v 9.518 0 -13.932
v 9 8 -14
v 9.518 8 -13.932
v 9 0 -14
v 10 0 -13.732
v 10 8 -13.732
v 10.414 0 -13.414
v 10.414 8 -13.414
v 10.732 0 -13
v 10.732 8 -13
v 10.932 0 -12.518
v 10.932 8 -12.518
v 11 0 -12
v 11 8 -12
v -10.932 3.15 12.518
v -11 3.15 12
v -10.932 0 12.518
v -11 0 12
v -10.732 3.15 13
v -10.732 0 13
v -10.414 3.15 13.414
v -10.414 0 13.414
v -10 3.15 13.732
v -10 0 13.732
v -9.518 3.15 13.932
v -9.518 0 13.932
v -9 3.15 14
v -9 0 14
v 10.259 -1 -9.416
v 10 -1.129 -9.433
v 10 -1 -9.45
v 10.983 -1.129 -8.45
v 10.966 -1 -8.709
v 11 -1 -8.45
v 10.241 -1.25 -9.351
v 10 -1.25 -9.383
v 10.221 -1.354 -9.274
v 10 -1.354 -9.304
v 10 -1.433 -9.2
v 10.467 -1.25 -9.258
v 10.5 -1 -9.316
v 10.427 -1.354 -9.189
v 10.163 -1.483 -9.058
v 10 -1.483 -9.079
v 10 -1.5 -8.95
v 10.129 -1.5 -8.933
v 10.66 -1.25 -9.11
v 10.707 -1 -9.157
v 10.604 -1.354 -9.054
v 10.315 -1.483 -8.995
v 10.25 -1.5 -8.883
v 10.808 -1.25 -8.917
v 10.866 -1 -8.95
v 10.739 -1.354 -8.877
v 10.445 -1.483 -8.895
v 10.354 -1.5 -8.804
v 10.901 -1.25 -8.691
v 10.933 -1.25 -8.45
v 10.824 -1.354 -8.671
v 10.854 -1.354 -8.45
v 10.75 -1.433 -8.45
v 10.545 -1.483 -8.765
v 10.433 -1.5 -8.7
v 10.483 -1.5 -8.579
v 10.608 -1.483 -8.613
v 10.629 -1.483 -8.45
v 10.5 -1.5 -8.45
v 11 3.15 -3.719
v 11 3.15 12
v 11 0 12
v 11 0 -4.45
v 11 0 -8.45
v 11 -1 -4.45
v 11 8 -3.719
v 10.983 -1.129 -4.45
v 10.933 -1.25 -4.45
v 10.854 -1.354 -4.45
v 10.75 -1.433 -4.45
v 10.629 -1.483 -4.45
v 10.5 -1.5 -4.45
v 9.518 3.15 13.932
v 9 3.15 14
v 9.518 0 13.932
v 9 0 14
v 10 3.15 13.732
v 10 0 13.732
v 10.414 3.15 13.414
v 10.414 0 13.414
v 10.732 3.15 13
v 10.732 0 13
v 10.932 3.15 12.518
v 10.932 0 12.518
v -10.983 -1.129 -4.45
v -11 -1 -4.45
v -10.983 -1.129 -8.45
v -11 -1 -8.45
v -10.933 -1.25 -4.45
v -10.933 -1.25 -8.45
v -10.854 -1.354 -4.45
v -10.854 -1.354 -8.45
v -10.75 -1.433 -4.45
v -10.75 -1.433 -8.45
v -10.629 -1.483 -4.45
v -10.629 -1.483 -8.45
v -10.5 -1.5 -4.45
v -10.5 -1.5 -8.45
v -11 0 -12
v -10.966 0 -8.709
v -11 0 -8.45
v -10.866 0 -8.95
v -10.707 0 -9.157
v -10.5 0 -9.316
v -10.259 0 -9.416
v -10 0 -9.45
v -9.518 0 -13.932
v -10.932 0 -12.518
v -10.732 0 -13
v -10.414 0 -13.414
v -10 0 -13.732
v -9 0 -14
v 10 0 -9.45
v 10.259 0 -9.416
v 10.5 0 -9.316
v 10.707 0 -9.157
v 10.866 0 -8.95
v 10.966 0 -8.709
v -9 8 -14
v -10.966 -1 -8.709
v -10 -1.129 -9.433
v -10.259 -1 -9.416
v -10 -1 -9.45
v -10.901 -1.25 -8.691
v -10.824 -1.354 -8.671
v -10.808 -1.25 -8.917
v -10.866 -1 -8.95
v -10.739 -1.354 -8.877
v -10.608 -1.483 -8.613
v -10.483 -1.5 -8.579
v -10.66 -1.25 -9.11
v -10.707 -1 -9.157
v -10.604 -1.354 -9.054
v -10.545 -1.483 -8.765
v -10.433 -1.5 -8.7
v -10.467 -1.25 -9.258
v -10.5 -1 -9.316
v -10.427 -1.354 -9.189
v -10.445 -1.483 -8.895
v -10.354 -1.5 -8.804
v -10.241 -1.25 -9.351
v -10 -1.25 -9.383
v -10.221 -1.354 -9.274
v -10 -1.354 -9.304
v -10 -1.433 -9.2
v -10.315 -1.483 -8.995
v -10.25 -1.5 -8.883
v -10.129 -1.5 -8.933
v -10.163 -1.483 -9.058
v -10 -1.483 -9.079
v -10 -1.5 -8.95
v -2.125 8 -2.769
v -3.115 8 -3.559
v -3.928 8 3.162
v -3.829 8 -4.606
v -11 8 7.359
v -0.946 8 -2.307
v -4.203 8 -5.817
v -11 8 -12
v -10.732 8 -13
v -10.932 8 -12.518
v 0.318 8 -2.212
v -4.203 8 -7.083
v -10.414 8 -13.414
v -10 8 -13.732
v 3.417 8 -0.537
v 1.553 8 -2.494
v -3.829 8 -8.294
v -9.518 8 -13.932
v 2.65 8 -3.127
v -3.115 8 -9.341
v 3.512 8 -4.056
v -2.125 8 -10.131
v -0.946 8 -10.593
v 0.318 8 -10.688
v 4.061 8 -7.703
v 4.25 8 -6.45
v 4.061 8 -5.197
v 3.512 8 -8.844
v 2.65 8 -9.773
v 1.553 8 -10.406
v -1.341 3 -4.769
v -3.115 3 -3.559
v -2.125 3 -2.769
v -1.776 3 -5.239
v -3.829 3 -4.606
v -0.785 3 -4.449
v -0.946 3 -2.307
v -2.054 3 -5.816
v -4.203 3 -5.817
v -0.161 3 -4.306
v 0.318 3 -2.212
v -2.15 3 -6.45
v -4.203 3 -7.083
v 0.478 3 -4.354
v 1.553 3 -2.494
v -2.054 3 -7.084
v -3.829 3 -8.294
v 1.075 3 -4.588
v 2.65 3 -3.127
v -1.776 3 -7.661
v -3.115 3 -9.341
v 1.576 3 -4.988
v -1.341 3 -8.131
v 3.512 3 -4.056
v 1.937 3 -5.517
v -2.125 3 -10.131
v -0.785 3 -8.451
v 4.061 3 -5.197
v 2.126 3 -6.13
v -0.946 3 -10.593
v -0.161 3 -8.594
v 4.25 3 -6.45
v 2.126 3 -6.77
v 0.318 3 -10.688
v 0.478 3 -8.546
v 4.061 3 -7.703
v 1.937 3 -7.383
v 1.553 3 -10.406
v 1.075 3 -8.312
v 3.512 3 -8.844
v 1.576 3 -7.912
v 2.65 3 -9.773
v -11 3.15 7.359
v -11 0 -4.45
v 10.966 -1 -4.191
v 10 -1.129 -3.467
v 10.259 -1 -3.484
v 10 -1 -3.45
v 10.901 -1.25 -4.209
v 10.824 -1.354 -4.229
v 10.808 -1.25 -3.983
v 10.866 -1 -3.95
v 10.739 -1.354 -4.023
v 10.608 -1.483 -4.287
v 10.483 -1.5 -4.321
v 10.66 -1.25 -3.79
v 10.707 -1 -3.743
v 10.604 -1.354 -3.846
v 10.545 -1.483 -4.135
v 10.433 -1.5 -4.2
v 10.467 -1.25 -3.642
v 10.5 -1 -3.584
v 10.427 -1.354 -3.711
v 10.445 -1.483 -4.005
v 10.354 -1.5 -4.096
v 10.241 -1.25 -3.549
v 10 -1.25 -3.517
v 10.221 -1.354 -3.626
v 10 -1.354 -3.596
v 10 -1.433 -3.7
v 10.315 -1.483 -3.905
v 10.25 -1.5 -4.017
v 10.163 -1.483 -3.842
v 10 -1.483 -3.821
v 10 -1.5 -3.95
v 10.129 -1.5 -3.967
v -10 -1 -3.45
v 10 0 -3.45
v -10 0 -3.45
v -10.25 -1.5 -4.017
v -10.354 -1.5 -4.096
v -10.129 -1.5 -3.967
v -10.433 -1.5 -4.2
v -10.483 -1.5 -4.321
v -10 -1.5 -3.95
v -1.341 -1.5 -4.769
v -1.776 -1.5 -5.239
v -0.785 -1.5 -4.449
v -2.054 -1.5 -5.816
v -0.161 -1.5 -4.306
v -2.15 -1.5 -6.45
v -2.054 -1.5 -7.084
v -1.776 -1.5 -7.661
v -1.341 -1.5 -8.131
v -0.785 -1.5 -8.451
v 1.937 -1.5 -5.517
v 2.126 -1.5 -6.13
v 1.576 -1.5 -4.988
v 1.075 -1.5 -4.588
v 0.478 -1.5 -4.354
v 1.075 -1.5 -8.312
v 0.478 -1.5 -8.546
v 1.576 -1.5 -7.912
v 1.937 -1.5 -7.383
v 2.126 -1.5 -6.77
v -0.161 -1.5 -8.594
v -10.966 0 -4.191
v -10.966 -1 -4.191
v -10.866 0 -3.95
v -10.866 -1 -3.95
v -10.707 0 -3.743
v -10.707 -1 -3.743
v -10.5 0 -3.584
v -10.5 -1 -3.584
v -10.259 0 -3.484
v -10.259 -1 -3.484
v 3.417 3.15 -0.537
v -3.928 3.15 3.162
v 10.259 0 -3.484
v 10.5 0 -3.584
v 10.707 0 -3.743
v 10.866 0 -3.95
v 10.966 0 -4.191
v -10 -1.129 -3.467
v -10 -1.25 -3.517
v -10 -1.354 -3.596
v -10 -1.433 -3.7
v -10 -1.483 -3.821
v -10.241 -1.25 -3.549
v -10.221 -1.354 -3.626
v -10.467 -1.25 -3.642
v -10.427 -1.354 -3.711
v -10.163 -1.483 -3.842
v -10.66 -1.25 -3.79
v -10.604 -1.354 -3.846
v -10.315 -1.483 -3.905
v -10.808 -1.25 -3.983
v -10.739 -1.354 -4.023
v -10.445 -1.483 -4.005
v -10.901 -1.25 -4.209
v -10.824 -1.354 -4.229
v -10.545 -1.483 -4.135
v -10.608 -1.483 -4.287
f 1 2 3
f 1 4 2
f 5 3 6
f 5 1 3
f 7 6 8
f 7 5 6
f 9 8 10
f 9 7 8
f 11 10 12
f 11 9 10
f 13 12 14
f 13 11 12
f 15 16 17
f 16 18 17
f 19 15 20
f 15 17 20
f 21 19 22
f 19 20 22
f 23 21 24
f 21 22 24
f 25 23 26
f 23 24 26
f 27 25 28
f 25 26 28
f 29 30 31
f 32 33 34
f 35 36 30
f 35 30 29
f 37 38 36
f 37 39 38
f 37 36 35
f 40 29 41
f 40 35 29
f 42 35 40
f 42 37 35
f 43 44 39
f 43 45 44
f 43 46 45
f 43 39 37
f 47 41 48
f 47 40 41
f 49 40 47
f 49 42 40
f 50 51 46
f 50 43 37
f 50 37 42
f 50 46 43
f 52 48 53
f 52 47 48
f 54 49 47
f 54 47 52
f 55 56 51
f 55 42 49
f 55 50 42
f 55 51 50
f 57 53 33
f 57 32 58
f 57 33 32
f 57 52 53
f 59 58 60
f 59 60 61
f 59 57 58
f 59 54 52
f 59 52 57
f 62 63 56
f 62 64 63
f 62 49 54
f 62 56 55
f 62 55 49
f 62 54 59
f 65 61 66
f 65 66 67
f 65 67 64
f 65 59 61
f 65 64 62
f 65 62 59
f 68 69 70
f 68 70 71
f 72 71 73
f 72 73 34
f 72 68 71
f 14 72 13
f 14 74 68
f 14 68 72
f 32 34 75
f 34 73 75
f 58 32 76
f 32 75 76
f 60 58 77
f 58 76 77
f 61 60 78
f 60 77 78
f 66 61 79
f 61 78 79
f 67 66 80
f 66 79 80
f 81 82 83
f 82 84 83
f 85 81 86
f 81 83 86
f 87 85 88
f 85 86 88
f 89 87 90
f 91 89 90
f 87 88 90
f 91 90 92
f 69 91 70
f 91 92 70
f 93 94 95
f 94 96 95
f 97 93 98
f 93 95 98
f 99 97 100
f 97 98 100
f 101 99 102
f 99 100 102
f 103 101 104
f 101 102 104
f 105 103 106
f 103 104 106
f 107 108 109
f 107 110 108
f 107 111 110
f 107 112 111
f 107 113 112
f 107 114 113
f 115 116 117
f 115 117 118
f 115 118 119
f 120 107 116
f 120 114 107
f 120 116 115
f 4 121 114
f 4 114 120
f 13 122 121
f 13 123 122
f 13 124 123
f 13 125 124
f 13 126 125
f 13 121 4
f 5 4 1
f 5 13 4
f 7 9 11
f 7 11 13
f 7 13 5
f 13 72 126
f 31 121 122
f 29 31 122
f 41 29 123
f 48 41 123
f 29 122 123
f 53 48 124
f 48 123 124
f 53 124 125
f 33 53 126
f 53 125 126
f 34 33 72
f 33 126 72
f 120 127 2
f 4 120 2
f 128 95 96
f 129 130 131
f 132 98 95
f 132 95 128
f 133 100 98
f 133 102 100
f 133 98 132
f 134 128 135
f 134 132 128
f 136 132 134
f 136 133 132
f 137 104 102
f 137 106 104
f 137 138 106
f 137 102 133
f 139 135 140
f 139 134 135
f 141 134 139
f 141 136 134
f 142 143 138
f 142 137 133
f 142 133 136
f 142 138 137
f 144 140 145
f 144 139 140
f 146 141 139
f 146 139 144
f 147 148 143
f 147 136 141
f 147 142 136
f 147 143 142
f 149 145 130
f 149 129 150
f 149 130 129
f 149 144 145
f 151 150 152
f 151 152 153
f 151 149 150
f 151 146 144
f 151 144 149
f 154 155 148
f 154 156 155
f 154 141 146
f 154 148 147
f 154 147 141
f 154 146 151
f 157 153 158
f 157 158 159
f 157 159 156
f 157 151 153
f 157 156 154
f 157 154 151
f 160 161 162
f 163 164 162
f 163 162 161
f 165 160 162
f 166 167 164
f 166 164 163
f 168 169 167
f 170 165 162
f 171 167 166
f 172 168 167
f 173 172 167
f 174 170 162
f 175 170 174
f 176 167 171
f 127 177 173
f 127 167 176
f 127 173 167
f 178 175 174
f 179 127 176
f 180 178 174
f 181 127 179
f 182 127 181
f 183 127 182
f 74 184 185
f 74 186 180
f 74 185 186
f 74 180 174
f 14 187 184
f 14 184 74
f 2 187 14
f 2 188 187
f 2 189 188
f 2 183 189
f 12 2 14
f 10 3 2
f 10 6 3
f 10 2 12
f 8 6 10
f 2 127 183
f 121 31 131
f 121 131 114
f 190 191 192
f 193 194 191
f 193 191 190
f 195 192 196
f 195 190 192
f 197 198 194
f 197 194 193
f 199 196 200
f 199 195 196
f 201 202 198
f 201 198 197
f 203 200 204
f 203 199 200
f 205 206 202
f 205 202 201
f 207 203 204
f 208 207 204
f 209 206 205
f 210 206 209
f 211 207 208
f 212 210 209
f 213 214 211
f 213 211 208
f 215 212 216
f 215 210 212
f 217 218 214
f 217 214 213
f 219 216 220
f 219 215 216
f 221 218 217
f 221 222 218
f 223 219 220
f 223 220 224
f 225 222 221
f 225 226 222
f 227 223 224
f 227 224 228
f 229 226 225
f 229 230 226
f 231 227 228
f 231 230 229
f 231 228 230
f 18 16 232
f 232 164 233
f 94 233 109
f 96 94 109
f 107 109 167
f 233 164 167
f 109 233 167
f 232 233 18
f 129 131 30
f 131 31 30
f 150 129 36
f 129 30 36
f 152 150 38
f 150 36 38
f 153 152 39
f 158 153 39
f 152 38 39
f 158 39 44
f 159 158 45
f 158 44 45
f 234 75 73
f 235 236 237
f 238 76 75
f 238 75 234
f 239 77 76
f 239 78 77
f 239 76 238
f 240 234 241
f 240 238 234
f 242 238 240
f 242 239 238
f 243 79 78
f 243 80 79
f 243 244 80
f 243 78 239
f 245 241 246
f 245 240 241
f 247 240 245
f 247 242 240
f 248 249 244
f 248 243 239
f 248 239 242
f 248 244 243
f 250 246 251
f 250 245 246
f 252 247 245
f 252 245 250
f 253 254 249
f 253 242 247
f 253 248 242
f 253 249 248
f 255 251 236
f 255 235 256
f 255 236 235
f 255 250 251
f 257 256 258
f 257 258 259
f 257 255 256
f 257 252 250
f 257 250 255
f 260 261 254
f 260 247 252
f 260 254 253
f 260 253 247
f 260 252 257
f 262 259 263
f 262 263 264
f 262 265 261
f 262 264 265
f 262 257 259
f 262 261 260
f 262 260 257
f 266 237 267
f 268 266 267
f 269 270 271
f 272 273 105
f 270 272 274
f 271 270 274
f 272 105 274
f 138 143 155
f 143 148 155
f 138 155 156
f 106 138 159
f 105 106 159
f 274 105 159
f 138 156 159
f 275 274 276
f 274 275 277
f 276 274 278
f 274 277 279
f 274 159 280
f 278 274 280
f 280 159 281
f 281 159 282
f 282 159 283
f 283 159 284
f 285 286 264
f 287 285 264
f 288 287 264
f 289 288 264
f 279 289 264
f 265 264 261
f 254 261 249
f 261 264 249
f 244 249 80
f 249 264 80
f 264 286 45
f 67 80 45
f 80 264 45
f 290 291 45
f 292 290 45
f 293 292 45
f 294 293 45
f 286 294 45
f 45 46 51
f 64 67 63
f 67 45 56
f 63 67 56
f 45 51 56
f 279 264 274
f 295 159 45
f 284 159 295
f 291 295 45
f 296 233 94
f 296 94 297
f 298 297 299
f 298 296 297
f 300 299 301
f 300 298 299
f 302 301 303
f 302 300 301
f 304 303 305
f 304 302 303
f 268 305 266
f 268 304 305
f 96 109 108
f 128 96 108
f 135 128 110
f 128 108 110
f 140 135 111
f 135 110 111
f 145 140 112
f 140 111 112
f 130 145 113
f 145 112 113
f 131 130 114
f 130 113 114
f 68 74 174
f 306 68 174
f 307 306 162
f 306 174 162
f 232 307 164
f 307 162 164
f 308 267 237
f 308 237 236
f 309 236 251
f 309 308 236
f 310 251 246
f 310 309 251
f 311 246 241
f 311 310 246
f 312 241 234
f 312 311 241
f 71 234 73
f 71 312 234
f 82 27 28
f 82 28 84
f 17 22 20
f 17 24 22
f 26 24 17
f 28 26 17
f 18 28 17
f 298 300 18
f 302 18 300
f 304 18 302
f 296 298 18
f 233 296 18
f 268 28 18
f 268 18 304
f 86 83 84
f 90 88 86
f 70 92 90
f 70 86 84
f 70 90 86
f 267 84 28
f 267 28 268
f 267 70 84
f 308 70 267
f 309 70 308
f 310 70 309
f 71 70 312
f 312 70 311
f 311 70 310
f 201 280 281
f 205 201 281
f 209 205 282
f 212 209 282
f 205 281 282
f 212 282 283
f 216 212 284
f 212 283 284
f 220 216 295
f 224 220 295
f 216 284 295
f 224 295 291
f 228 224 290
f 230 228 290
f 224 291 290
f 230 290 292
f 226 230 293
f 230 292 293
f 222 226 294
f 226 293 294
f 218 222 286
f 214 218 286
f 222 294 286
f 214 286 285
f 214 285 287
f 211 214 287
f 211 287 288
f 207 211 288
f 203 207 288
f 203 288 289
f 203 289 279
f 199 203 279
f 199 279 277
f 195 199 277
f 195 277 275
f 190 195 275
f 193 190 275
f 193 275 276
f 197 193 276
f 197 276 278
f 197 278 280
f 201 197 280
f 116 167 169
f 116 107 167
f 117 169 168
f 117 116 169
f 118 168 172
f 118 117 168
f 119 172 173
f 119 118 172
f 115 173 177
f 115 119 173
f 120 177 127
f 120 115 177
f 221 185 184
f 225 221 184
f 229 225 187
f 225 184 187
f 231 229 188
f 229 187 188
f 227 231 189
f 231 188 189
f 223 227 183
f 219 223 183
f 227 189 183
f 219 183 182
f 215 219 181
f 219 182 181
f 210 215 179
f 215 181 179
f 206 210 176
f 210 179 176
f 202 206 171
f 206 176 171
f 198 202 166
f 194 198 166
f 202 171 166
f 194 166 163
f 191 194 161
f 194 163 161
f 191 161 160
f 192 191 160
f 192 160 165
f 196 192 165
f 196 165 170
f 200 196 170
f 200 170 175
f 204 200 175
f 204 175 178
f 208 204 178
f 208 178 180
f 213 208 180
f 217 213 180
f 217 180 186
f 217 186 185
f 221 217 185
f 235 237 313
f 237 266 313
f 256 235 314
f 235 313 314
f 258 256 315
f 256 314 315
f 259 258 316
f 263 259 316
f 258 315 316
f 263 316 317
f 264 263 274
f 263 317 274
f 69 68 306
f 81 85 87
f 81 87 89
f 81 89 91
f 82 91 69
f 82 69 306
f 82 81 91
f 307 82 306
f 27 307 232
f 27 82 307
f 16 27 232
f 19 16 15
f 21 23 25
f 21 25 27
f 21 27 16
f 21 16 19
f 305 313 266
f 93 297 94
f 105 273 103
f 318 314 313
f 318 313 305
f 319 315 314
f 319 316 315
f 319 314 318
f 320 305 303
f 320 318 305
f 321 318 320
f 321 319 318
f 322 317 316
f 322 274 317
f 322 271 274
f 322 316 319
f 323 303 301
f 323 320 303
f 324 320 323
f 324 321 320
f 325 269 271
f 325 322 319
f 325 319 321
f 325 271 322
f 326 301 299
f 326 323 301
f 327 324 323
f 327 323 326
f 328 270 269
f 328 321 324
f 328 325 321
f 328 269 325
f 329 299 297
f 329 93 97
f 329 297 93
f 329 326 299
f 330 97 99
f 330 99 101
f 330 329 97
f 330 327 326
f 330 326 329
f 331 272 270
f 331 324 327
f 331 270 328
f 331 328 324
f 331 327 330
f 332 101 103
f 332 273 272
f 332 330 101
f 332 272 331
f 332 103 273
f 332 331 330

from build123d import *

# Parameters (mm, degrees)
SKETCH1_W                                        = 22
SKETCH1_H                                        = 28
BOSS_EXTRUDE1_DEPTH                              = 9.5
SKETCH2_W                                        = 17.45
SKETCH2_H                                        = 1.5
CUT_EXTRUDE1_DEPTH                               = 23
CUT_EXTRUDE2_DEPTH                               = 4.85
SKETCH4_W                                        = 4.55
SKETCH4_H                                        = 1.5
CUT_EXTRUDE3_DEPTH                               = 23
CBORE_FOR_M4_HEX_HEAD_MACHINE_SCREW1_D           = 4.3
CBORE_FOR_M4_HEX_HEAD_MACHINE_SCREW1_DEPTH       = 9.5
CBORE_FOR_M4_HEX_HEAD_MACHINE_SCREW1_CBORE_D     = 8.5
CBORE_FOR_M4_HEX_HEAD_MACHINE_SCREW1_CBORE_DEPTH = 5
FILLET1_R                                        = 1
FILLET2_R                                        = 0.5
FILLET3_R                                        = 2


with BuildPart() as part:
    # Sketch1 → Boss-Extrude1 (new body)
    with BuildSketch(Plane(origin=(0, 8, 0), x_dir=(1, 0, 0), z_dir=(0, 1, 0))):
        Rectangle(SKETCH1_W, SKETCH1_H)
    extrude(amount=-BOSS_EXTRUDE1_DEPTH)

    # Sketch2 → Cut-Extrude1 (cut, through all)
    with BuildSketch(Plane(origin=(11, 0, 0), x_dir=(0, 0, -1), z_dir=(1, 0, 0))):
        with Locations((-5.275, -0.75)):
            Rectangle(SKETCH2_W, SKETCH2_H)
    extrude(amount=-CUT_EXTRUDE1_DEPTH, mode=Mode.SUBTRACT)

    # Sketch3 → Cut-Extrude2 (cut)
    with BuildSketch(Plane(origin=(0, 8, 0), x_dir=(-1, 0, 0), z_dir=(0, 1, 0))):
        with BuildLine():
            Line((11, 7.358592124), (11, 14))
            Line((11, 14), (-11, 14))
            Line((-11, 14), (-11, -3.718814308))
            ThreePointArc((-11, -3.718814308), (0.2873816, 1.249142024), (11, 7.358592124))
        make_face()
    extrude(amount=-CUT_EXTRUDE2_DEPTH, mode=Mode.SUBTRACT)

    # Sketch4 → Cut-Extrude3 (cut, through all)
    with BuildSketch(Plane(origin=(11, 0, 0), x_dir=(0, 0, -1), z_dir=(1, 0, 0))):
        with Locations((11.725, -0.75)):
            Rectangle(SKETCH4_W, SKETCH4_H)
    extrude(amount=-CUT_EXTRUDE3_DEPTH, mode=Mode.SUBTRACT)

    # CBORE for M4 Hex Head Machine Screw1
    with Locations(Plane(origin=(0, 8, 0), x_dir=(1, 0, 0), z_dir=(0, 1, 0))):
        with Locations((0, 6.45)):
            CounterBoreHole(CBORE_FOR_M4_HEX_HEAD_MACHINE_SCREW1_D / 2, CBORE_FOR_M4_HEX_HEAD_MACHINE_SCREW1_CBORE_D / 2, CBORE_FOR_M4_HEX_HEAD_MACHINE_SCREW1_CBORE_DEPTH, depth=CBORE_FOR_M4_HEX_HEAD_MACHINE_SCREW1_DEPTH)

    # Fillet1
    fillet1_edges = [part.edges().sort_by_distance(p)[0] for p in [
        (-11, -0.75, -3.45),
        (11, -0.75, -3.45),
        (-11, -0.75, -9.45),
        (11, -0.75, -9.45),
    ]]
    fillet(fillet1_edges, radius=FILLET1_R)

    # Fillet2
    fillet2_edges = [part.edges().sort_by_distance(p)[0] for p in [
        (0, -1.5, -3.45),
        (11, -1.5, -6.45),
        (-11, -1.5, -6.45),
        (0, -1.5, -9.45),
        (-10.707106781, -1.5, -9.157106781),
        (10.707106781, -1.5, -9.157106781),
        (-10.707106781, -1.5, -3.742893219),
        (10.707106781, -1.5, -3.742893219),
    ]]
    fillet(fillet2_edges, radius=FILLET2_R)

    # Fillet3
    fillet3_edges = [part.edges().sort_by_distance(p)[0] for p in [
        (11, 1.575, 14),
        (-11, 1.575, 14),
        (11, 4, -14),
        (-11, 4, -14),
    ]]
    fillet(fillet3_edges, radius=FILLET3_R)


solid = part.part
